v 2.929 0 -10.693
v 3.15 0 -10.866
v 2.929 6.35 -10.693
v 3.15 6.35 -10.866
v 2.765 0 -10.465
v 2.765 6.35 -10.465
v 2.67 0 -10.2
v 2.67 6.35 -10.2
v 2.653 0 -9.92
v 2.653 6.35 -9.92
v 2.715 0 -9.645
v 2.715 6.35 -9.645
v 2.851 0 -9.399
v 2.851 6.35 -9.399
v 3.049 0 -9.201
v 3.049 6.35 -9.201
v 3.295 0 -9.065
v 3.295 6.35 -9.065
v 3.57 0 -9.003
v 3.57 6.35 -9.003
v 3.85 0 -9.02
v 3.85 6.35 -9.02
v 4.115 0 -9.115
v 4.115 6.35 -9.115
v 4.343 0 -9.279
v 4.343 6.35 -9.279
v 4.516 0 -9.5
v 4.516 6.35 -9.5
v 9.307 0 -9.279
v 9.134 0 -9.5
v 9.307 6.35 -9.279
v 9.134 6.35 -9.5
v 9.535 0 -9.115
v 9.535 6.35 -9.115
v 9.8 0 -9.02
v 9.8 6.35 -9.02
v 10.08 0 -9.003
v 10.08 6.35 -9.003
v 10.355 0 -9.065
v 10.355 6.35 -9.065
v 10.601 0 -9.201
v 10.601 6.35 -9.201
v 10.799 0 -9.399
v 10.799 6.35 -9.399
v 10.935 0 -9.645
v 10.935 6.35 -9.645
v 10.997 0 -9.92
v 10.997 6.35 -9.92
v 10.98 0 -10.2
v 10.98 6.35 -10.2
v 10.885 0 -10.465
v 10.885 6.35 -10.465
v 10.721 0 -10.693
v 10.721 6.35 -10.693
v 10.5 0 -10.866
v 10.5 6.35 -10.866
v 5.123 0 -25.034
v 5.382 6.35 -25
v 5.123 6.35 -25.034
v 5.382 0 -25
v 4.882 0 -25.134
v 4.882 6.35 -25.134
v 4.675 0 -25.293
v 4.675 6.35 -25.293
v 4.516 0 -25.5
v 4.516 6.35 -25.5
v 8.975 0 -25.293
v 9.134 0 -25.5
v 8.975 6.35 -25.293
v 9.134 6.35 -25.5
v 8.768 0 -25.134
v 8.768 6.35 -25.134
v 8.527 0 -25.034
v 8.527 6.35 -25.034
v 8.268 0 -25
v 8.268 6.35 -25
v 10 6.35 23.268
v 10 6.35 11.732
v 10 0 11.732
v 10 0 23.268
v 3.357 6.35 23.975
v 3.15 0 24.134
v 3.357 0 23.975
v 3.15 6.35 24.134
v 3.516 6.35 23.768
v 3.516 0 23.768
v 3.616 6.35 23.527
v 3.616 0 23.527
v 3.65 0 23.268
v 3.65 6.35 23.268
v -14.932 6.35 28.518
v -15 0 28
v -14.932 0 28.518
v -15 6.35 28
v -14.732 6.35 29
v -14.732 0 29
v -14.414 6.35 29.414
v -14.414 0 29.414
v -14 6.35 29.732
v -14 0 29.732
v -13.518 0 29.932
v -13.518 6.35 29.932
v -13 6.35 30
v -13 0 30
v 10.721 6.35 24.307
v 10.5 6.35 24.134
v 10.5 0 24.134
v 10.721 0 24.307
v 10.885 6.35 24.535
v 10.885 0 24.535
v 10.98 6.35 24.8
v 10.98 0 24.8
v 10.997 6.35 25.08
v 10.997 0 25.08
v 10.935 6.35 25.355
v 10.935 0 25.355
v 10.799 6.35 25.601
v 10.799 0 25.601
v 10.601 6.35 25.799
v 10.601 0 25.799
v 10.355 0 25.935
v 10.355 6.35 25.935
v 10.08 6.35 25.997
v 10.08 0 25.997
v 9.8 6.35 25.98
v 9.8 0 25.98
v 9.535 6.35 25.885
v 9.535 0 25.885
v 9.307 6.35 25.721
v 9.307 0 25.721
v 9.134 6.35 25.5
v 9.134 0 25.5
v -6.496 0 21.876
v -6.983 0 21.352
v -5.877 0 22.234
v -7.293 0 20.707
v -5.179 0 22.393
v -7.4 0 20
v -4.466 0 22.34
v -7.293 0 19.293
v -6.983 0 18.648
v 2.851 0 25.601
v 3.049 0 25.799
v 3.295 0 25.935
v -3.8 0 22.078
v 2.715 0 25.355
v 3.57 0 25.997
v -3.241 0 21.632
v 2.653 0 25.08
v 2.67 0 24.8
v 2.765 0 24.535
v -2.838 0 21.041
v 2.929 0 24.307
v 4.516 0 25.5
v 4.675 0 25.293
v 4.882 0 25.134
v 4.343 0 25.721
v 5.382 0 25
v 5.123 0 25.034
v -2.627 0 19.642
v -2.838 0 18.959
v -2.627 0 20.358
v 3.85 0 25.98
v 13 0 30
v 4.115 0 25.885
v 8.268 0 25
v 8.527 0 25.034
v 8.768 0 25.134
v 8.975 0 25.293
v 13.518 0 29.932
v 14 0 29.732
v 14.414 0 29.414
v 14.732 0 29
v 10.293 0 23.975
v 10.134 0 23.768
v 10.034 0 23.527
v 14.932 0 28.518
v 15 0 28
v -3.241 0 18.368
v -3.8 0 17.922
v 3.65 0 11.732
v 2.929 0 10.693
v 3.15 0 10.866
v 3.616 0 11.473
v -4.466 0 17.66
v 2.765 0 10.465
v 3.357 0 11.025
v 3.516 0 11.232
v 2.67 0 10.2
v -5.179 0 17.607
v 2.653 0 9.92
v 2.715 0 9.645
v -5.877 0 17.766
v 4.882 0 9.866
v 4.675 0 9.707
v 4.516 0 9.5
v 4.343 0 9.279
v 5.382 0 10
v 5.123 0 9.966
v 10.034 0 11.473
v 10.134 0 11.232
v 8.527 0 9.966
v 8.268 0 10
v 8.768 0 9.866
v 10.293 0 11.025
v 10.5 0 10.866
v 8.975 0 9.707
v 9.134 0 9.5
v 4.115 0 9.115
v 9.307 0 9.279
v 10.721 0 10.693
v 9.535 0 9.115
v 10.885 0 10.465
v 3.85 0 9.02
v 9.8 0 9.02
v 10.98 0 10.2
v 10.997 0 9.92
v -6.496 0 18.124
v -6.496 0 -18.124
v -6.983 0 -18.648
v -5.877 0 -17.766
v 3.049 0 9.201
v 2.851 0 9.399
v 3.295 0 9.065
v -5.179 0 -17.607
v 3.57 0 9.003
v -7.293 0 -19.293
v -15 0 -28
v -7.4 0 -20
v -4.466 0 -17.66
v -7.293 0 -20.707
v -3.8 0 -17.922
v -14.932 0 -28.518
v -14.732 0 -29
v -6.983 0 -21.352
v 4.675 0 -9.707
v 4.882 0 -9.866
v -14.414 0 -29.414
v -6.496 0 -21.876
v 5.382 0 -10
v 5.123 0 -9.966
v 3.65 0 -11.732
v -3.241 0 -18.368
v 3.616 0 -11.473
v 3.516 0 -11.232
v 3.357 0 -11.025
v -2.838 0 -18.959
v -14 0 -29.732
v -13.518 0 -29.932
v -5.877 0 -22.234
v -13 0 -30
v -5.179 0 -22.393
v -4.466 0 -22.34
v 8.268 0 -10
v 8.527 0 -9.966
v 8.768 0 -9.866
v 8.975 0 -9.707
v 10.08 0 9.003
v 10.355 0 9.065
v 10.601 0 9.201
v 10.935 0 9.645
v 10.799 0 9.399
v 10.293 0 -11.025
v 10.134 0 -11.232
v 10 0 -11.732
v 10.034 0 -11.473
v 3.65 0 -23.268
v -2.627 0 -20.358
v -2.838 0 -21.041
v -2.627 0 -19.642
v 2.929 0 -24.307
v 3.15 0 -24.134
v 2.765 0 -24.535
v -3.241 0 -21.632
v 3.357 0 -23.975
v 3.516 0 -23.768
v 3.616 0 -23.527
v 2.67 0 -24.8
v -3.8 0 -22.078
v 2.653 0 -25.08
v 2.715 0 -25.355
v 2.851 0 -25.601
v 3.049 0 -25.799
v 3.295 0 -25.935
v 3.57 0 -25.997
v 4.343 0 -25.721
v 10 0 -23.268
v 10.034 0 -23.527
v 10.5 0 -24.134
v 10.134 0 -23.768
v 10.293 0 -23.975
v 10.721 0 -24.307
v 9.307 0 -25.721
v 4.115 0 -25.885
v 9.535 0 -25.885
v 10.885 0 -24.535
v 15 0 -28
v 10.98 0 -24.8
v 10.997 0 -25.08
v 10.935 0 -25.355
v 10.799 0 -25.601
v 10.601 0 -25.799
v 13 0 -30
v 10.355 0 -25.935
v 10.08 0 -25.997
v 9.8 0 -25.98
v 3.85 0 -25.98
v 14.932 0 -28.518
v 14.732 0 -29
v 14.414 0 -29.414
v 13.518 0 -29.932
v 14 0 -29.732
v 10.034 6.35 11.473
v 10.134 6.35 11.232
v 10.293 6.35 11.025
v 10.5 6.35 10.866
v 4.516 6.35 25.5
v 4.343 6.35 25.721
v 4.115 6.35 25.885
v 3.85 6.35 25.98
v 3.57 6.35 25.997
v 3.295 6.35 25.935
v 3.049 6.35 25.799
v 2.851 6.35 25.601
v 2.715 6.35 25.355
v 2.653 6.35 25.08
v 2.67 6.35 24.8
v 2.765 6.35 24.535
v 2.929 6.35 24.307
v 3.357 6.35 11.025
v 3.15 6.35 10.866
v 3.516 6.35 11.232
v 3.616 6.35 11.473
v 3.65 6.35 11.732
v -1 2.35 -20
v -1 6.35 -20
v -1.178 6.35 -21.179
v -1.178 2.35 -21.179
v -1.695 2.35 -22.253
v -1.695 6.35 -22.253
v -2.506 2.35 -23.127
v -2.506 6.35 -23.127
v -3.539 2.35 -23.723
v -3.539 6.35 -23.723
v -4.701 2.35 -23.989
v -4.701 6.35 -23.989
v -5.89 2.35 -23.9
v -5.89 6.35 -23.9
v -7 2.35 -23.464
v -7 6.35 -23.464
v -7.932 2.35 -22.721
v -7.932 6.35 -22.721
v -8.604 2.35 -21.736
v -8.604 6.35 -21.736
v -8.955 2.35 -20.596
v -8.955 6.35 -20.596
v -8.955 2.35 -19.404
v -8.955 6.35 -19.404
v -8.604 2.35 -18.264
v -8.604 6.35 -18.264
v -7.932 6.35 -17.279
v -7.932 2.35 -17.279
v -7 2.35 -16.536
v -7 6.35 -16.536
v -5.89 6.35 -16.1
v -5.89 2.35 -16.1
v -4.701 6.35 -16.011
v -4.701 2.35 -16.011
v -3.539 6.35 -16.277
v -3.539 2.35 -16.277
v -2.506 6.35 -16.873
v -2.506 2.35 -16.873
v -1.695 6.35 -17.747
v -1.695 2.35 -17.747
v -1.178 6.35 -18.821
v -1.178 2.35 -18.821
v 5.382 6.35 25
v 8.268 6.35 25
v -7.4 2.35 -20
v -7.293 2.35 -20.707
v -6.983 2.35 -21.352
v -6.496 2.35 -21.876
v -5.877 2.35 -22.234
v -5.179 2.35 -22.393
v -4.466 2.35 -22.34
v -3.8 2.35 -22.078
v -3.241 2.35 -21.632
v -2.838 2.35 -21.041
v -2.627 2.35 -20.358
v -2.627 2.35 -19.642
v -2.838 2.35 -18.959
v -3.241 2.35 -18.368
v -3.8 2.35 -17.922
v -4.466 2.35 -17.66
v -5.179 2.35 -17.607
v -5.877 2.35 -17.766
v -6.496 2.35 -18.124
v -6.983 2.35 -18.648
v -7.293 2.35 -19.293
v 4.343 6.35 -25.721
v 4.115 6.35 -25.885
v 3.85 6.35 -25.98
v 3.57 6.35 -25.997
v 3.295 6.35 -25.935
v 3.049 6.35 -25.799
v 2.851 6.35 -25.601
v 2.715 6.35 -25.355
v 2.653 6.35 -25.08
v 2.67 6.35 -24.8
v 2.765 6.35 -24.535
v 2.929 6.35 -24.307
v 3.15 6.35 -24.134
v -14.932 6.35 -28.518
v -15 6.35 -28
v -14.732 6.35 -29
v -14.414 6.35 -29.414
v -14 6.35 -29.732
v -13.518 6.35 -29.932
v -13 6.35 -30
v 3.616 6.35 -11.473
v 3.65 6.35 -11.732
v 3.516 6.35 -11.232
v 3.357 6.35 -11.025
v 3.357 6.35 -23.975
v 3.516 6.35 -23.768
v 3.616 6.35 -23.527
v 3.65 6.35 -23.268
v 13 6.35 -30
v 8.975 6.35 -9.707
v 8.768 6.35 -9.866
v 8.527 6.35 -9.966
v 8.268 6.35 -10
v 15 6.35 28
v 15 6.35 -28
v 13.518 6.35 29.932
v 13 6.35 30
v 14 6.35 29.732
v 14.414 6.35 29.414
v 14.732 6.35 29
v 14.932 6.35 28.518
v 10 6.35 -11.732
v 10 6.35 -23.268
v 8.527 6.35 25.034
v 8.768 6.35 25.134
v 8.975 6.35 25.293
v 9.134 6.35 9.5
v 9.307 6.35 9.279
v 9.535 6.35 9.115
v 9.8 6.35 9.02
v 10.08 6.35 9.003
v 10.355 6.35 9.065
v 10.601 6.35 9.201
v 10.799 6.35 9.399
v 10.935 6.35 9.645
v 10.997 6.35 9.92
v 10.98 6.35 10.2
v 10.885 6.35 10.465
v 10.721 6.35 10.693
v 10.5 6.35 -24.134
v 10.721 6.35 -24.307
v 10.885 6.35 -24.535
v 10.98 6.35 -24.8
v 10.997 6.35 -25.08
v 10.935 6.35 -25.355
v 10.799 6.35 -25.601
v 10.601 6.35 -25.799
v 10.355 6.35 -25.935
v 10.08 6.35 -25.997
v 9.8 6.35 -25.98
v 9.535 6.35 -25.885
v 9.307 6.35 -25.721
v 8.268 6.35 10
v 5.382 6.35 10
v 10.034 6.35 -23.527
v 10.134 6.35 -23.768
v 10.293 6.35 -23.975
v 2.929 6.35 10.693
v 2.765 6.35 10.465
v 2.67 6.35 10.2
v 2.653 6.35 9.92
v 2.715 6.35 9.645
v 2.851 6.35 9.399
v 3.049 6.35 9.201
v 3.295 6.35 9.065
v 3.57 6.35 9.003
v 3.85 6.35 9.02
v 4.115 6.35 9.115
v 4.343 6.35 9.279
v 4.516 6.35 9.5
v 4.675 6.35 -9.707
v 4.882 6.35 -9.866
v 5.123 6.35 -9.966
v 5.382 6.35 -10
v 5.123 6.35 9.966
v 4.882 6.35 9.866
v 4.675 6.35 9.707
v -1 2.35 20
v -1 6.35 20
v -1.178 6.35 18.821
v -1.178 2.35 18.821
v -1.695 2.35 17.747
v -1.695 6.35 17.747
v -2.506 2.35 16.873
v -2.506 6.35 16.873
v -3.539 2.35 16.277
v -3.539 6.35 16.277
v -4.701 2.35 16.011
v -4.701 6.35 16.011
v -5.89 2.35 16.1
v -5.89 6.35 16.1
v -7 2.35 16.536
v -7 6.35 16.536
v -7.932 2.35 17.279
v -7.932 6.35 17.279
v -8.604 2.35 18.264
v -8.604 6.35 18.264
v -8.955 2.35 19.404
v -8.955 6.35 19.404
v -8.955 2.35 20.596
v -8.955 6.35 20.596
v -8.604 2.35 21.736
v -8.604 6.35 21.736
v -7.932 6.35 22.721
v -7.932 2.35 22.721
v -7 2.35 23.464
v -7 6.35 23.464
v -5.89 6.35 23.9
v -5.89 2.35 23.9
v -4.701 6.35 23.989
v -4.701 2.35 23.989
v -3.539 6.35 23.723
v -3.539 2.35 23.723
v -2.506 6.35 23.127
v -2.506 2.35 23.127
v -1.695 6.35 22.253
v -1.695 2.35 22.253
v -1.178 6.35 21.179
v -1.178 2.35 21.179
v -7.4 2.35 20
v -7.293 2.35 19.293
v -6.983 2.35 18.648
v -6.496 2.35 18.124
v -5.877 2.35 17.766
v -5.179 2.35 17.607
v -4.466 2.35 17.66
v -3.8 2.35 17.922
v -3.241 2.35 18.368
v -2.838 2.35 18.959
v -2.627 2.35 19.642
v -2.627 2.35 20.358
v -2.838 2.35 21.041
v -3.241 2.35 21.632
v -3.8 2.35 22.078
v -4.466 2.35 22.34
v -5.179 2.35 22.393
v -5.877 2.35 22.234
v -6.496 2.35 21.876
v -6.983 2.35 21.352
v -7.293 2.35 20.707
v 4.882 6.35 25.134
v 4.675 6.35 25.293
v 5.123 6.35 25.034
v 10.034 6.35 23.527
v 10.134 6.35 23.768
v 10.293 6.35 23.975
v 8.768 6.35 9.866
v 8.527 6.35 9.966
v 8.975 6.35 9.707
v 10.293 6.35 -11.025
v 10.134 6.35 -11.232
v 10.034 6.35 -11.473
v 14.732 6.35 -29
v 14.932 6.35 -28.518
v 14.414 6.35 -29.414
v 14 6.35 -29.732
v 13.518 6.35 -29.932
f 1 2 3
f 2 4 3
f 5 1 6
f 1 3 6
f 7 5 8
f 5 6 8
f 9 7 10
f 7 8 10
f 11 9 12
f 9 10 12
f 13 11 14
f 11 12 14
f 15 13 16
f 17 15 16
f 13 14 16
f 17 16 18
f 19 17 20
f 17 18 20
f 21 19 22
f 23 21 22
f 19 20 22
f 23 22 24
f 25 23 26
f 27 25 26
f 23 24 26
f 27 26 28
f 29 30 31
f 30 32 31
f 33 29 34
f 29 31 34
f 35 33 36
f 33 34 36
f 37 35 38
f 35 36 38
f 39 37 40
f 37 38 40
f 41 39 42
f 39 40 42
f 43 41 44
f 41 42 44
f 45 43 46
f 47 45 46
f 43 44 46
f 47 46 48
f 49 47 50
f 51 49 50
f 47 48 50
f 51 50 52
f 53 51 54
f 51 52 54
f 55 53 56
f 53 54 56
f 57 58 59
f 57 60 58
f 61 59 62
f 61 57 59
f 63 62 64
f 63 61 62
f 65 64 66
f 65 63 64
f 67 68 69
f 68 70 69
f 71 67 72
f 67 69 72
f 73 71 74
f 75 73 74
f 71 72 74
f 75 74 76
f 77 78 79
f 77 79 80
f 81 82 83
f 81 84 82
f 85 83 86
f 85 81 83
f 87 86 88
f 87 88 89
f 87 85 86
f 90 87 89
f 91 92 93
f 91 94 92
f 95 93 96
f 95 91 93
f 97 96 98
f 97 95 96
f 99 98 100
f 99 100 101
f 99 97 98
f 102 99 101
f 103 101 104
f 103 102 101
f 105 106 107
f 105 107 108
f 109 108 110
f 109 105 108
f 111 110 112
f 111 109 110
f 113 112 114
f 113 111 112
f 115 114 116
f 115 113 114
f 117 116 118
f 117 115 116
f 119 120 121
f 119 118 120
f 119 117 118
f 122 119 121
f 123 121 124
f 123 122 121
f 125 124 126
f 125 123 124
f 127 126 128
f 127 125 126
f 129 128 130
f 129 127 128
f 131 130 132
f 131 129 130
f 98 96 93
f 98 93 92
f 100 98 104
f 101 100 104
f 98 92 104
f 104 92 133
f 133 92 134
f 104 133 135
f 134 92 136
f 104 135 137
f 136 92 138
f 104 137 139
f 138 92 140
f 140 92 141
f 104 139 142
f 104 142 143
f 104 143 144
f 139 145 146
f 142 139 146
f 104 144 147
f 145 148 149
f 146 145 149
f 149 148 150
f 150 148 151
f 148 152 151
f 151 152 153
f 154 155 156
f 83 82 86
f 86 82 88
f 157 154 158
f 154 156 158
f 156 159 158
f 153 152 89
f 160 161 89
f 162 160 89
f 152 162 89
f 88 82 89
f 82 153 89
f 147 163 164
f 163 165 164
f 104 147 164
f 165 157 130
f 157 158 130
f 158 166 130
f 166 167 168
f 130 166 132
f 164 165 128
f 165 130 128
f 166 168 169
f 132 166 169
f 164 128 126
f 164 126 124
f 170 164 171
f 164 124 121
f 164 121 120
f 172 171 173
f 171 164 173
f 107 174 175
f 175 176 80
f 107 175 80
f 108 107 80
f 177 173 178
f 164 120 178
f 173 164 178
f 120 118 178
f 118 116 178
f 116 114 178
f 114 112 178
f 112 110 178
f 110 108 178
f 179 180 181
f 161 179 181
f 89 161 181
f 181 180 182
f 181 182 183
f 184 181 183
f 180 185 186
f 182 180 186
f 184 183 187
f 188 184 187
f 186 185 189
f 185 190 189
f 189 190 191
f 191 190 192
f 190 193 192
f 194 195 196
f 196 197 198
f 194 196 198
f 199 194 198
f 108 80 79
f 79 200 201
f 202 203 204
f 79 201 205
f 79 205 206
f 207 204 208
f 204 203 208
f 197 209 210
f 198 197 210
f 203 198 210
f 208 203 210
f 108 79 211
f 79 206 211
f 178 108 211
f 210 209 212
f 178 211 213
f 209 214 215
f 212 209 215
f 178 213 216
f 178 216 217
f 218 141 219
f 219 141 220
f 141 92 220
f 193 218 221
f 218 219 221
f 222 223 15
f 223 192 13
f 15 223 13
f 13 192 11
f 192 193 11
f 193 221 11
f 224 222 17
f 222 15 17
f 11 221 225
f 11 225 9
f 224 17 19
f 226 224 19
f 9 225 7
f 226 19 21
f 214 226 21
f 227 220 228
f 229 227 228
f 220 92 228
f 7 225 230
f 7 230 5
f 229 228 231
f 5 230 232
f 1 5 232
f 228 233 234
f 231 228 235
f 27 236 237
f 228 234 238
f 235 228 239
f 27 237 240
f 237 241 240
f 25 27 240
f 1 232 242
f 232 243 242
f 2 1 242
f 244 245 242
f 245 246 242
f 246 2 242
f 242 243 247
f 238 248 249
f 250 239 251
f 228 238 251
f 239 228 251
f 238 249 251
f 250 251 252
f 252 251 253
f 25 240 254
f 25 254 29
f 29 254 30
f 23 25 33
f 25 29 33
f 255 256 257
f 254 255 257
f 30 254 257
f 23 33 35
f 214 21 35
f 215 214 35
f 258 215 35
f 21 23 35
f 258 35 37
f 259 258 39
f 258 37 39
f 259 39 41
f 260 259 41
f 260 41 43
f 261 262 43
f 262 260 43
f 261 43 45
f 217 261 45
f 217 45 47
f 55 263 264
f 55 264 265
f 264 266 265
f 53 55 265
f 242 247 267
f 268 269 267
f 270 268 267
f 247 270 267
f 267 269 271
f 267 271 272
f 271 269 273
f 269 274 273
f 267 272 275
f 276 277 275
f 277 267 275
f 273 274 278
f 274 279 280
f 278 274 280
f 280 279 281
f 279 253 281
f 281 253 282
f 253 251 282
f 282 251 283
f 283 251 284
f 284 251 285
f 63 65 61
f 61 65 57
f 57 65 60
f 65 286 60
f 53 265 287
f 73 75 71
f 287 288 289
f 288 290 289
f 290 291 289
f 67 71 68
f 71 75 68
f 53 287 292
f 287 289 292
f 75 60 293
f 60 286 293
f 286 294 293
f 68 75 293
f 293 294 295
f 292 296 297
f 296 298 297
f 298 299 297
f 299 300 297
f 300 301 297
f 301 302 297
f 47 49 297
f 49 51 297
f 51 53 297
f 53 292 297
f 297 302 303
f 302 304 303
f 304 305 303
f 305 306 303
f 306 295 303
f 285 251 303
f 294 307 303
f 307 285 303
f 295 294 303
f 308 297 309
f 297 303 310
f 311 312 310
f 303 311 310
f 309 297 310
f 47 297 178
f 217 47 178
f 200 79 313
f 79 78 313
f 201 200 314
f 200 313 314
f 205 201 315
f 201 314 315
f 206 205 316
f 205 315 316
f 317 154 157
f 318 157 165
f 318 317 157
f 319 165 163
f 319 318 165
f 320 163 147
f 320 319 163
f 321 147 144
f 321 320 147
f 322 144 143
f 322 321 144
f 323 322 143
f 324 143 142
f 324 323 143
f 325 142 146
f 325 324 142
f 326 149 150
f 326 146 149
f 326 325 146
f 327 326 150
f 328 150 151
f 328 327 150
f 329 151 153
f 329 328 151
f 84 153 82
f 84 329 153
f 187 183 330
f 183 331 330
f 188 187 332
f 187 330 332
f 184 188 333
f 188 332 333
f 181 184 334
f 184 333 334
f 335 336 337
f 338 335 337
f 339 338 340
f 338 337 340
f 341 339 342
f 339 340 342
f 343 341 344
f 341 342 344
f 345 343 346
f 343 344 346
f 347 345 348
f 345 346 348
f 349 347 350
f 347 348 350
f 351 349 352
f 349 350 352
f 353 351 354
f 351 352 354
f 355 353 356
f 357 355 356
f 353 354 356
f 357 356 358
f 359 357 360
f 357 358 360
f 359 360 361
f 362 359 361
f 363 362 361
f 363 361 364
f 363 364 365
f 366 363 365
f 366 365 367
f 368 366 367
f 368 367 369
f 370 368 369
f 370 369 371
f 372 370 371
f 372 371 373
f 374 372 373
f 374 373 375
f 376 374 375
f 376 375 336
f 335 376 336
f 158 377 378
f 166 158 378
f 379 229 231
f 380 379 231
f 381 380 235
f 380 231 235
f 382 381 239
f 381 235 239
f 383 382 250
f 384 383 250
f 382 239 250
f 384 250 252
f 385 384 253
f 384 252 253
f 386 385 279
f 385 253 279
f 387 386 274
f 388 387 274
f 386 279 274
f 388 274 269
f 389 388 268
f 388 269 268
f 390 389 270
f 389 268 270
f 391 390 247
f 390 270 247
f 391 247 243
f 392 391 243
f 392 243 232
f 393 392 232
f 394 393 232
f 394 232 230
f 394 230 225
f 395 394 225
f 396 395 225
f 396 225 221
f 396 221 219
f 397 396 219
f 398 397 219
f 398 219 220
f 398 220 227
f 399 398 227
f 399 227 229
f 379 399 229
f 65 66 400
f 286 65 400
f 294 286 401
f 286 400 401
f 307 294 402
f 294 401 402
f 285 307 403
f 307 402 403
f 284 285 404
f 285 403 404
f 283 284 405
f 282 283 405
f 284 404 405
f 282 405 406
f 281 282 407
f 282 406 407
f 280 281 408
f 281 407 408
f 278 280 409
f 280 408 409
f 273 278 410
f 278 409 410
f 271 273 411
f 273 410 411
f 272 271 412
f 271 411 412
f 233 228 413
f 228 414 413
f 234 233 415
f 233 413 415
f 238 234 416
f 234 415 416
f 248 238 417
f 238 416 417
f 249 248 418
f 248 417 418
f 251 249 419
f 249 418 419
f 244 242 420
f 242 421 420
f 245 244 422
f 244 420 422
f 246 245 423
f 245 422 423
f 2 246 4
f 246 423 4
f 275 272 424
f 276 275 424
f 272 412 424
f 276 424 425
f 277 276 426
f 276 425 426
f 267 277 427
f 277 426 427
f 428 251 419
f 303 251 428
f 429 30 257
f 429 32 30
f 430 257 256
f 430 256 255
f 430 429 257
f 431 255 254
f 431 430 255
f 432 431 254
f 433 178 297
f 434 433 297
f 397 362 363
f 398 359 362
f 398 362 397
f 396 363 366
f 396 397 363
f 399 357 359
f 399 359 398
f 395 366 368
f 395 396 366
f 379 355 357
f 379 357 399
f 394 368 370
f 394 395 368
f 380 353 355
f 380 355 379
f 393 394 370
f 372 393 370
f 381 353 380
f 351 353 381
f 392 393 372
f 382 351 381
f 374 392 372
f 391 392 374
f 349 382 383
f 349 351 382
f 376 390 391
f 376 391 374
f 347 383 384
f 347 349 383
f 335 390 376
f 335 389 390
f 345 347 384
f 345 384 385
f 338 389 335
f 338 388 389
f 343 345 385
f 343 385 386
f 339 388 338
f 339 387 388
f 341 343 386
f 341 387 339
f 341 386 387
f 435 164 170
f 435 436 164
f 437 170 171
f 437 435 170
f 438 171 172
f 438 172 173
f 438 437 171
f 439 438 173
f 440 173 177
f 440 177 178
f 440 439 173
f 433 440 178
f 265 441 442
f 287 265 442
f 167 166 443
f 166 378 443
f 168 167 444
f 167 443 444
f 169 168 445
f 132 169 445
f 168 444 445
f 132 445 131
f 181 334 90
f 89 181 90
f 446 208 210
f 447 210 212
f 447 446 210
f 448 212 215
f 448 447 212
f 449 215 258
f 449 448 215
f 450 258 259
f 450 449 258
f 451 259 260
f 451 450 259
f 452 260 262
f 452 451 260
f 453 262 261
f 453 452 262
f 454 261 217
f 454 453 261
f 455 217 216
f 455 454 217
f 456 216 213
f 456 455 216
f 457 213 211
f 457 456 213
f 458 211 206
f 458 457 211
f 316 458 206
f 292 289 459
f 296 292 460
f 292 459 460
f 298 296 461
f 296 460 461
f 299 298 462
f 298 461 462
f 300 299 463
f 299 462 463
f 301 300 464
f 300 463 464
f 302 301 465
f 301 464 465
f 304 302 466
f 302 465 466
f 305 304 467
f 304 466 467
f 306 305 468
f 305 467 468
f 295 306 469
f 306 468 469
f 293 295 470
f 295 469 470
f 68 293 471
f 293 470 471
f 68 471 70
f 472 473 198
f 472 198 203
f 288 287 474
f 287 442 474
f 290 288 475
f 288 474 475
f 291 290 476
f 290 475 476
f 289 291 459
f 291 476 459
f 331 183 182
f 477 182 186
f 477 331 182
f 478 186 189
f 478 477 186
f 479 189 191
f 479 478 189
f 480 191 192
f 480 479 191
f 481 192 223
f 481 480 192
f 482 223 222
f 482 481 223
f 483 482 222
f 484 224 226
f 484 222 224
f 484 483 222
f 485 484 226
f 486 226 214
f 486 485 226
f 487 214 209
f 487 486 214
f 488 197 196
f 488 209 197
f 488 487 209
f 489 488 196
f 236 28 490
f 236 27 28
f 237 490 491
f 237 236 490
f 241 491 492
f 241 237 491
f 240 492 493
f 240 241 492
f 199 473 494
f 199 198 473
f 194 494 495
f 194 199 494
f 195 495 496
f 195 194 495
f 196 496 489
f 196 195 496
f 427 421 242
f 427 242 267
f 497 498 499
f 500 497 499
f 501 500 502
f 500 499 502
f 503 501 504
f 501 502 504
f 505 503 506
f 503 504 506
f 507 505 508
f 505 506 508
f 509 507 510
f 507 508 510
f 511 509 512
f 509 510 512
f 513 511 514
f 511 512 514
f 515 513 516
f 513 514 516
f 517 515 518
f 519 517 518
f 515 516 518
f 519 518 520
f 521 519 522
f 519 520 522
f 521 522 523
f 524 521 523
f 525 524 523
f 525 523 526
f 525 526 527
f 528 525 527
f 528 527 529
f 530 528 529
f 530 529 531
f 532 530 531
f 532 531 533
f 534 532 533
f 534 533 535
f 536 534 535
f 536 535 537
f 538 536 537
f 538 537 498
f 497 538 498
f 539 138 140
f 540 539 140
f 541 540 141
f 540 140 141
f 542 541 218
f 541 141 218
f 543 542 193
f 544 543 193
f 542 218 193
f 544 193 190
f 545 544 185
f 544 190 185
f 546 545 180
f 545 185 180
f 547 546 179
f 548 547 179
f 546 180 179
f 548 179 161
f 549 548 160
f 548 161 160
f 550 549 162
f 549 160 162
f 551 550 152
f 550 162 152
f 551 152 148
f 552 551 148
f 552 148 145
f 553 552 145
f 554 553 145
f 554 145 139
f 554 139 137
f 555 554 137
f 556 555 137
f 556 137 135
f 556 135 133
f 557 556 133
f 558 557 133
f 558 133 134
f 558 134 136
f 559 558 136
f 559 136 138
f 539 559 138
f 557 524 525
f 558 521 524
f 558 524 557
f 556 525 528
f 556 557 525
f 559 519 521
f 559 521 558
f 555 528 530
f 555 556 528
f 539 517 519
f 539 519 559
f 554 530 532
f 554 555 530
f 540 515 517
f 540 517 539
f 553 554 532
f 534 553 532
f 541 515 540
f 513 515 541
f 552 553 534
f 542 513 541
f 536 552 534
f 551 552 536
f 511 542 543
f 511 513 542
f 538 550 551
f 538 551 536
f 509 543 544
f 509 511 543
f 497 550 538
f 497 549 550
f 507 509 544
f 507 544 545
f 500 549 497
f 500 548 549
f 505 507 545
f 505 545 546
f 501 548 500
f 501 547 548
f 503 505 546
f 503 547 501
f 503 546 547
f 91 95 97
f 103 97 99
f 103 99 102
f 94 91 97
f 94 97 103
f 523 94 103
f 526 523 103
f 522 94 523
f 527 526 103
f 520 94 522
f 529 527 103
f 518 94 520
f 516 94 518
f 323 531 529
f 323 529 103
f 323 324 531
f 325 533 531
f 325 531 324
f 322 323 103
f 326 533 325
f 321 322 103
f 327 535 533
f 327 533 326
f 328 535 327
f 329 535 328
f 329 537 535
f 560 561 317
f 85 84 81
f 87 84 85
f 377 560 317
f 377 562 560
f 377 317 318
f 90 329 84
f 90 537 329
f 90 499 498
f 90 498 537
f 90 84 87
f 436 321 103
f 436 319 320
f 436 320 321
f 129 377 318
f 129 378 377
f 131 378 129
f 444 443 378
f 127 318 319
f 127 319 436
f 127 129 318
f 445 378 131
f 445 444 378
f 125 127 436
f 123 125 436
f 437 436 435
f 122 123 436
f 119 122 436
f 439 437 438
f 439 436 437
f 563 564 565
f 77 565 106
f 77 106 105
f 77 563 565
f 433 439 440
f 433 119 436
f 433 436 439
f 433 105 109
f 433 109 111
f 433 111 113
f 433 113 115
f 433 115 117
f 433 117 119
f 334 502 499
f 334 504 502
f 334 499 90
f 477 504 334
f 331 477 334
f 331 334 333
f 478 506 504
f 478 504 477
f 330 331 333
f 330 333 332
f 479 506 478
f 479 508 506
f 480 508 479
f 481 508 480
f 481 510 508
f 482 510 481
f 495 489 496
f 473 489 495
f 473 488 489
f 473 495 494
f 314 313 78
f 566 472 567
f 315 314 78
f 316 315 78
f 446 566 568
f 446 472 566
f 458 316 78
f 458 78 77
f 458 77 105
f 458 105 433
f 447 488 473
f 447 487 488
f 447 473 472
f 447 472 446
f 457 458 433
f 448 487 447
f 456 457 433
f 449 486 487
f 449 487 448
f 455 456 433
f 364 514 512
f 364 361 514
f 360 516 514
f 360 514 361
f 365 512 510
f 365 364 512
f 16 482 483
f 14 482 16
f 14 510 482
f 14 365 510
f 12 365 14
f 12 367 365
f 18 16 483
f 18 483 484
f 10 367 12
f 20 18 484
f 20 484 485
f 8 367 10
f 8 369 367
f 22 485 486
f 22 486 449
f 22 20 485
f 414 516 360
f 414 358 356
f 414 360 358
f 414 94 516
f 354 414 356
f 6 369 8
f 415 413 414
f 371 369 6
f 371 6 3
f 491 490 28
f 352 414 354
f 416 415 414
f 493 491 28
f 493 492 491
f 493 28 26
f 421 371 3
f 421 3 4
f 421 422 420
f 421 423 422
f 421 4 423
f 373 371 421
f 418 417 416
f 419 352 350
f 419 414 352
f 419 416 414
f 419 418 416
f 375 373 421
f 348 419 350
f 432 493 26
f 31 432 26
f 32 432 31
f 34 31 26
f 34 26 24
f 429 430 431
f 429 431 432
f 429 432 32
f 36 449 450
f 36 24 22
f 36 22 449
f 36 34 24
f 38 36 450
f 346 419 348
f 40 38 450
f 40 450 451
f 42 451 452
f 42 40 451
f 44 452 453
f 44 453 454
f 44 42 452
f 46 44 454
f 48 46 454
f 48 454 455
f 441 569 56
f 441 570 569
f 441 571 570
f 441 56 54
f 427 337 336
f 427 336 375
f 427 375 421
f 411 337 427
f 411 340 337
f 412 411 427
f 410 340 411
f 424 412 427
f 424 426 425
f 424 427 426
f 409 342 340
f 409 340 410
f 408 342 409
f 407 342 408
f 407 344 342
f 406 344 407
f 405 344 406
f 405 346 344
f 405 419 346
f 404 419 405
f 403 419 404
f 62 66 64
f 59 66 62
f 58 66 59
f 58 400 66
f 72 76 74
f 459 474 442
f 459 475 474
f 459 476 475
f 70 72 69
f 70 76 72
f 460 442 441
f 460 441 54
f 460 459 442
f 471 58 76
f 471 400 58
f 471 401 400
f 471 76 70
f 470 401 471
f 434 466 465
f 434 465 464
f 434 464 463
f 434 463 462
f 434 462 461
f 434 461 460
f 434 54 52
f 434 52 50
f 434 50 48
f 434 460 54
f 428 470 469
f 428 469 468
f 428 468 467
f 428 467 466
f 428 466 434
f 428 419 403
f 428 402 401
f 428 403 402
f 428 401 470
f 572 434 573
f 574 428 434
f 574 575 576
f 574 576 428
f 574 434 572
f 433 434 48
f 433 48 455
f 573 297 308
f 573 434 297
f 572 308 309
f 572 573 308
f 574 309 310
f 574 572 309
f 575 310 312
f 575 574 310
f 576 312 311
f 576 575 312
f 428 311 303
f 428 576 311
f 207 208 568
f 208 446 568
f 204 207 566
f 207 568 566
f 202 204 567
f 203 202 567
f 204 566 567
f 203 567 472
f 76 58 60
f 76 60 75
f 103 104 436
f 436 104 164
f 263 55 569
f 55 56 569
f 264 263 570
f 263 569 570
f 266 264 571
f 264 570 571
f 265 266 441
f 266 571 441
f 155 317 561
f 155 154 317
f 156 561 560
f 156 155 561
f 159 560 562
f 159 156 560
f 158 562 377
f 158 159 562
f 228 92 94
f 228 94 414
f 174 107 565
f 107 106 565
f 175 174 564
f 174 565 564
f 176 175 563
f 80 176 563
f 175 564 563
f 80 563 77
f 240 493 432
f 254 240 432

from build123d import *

# Parameters (mm, degrees)
SKETCH1_W                      = 30
SKETCH1_H                      = 60
BOSS_EXTRUDE1_DEPTH            = 6.35
CBORE_FOR_M4_SHCS1_D           = 4.8
CBORE_FOR_M4_SHCS1_DEPTH       = 6.35
CBORE_FOR_M4_SHCS1_CBORE_D     = 8
CBORE_FOR_M4_SHCS1_CBORE_DEPTH = 4
SKETCH4_W                      = 6.35
SKETCH4_H                      = 15
CUT_EXTRUDE1_DEPTH             = 7.35
SKETCH5_R                      = 1
CUT_EXTRUDE2_DEPTH             = 7.35
FILLET1_R                      = 1
FILLET2_R                      = 2


with BuildPart() as part:
    # Sketch1 → Boss-Extrude1 (new body)
    with BuildSketch(Plane(origin=(0, 0, 0), x_dir=(1, 0, 0), z_dir=(0, 1, 0))):
        Rectangle(SKETCH1_W, SKETCH1_H)
    extrude(amount=BOSS_EXTRUDE1_DEPTH)

    # CBORE for M4 SHCS1
    with Locations(Plane(origin=(0, 6.35, 0), x_dir=(1, 0, 0), z_dir=(0, 1, 0))):
        with Locations((-5, 20), (-5, -20)):
            CounterBoreHole(CBORE_FOR_M4_SHCS1_D / 2, CBORE_FOR_M4_SHCS1_CBORE_D / 2, CBORE_FOR_M4_SHCS1_CBORE_DEPTH, depth=CBORE_FOR_M4_SHCS1_DEPTH)

    # Sketch4 → Cut-Extrude1 (cut, through all)
    with BuildSketch(Plane(origin=(0, 6.35, 0), x_dir=(1, 0, 0), z_dir=(0, 1, 0))):
        with Locations((6.825, 17.5)):
            Rectangle(SKETCH4_W, SKETCH4_H)
    cut_extrude1 = extrude(amount=-CUT_EXTRUDE1_DEPTH, mode=Mode.SUBTRACT)

    # Sketch5 → Cut-Extrude2 (cut, through all)
    with BuildSketch(Plane(origin=(0, 6.35, 0), x_dir=(1, 0, 0), z_dir=(0, 1, 0))):
        with Locations((3.65, 25)):
            Circle(SKETCH5_R)
        with Locations((10, 25)):
            Circle(SKETCH5_R)
        with Locations((10, 10)):
            Circle(SKETCH5_R)
        with Locations((3.65, 10)):
            Circle(SKETCH5_R)
    cut_extrude2 = extrude(amount=-CUT_EXTRUDE2_DEPTH, mode=Mode.SUBTRACT)

    # Mirror1: Cut-Extrude1, Cut-Extrude2 across plane
    add(cut_extrude1.mirror(Plane.XY), mode=Mode.SUBTRACT)
    add(cut_extrude2.mirror(Plane.XY), mode=Mode.SUBTRACT)

    # Fillet1
    fillet1_edges = [part.edges().sort_by_distance(p)[0] for p in [
        (9, 3.175, 25),
        (10, 3.175, 11),
        (4.65, 3.175, 10),
        (3.65, 3.175, 11),
        (9, 3.175, 10),
        (10, 3.175, 24),
        (3.65, 3.175, 24),
        (9, 3.175, -10),
        (4.65, 3.175, -10),
        (10, 3.175, -24),
        (4.65, 3.175, -25),
        (3.65, 3.175, -11),
        (10, 3.175, -11),
        (9, 3.175, -25),
        (3.65, 3.175, -24),
        (4.65, 3.175, 25),
    ]]
    fillet(fillet1_edges, radius=FILLET1_R)

    # Fillet2
    fillet2_edges = [part.edges().sort_by_distance(p)[0] for p in [
        (-15, 3.175, -30),
        (15, 3.175, -30),
        (15, 3.175, 30),
        (-15, 3.175, 30),
    ]]
    fillet(fillet2_edges, radius=FILLET2_R)


solid = part.part
